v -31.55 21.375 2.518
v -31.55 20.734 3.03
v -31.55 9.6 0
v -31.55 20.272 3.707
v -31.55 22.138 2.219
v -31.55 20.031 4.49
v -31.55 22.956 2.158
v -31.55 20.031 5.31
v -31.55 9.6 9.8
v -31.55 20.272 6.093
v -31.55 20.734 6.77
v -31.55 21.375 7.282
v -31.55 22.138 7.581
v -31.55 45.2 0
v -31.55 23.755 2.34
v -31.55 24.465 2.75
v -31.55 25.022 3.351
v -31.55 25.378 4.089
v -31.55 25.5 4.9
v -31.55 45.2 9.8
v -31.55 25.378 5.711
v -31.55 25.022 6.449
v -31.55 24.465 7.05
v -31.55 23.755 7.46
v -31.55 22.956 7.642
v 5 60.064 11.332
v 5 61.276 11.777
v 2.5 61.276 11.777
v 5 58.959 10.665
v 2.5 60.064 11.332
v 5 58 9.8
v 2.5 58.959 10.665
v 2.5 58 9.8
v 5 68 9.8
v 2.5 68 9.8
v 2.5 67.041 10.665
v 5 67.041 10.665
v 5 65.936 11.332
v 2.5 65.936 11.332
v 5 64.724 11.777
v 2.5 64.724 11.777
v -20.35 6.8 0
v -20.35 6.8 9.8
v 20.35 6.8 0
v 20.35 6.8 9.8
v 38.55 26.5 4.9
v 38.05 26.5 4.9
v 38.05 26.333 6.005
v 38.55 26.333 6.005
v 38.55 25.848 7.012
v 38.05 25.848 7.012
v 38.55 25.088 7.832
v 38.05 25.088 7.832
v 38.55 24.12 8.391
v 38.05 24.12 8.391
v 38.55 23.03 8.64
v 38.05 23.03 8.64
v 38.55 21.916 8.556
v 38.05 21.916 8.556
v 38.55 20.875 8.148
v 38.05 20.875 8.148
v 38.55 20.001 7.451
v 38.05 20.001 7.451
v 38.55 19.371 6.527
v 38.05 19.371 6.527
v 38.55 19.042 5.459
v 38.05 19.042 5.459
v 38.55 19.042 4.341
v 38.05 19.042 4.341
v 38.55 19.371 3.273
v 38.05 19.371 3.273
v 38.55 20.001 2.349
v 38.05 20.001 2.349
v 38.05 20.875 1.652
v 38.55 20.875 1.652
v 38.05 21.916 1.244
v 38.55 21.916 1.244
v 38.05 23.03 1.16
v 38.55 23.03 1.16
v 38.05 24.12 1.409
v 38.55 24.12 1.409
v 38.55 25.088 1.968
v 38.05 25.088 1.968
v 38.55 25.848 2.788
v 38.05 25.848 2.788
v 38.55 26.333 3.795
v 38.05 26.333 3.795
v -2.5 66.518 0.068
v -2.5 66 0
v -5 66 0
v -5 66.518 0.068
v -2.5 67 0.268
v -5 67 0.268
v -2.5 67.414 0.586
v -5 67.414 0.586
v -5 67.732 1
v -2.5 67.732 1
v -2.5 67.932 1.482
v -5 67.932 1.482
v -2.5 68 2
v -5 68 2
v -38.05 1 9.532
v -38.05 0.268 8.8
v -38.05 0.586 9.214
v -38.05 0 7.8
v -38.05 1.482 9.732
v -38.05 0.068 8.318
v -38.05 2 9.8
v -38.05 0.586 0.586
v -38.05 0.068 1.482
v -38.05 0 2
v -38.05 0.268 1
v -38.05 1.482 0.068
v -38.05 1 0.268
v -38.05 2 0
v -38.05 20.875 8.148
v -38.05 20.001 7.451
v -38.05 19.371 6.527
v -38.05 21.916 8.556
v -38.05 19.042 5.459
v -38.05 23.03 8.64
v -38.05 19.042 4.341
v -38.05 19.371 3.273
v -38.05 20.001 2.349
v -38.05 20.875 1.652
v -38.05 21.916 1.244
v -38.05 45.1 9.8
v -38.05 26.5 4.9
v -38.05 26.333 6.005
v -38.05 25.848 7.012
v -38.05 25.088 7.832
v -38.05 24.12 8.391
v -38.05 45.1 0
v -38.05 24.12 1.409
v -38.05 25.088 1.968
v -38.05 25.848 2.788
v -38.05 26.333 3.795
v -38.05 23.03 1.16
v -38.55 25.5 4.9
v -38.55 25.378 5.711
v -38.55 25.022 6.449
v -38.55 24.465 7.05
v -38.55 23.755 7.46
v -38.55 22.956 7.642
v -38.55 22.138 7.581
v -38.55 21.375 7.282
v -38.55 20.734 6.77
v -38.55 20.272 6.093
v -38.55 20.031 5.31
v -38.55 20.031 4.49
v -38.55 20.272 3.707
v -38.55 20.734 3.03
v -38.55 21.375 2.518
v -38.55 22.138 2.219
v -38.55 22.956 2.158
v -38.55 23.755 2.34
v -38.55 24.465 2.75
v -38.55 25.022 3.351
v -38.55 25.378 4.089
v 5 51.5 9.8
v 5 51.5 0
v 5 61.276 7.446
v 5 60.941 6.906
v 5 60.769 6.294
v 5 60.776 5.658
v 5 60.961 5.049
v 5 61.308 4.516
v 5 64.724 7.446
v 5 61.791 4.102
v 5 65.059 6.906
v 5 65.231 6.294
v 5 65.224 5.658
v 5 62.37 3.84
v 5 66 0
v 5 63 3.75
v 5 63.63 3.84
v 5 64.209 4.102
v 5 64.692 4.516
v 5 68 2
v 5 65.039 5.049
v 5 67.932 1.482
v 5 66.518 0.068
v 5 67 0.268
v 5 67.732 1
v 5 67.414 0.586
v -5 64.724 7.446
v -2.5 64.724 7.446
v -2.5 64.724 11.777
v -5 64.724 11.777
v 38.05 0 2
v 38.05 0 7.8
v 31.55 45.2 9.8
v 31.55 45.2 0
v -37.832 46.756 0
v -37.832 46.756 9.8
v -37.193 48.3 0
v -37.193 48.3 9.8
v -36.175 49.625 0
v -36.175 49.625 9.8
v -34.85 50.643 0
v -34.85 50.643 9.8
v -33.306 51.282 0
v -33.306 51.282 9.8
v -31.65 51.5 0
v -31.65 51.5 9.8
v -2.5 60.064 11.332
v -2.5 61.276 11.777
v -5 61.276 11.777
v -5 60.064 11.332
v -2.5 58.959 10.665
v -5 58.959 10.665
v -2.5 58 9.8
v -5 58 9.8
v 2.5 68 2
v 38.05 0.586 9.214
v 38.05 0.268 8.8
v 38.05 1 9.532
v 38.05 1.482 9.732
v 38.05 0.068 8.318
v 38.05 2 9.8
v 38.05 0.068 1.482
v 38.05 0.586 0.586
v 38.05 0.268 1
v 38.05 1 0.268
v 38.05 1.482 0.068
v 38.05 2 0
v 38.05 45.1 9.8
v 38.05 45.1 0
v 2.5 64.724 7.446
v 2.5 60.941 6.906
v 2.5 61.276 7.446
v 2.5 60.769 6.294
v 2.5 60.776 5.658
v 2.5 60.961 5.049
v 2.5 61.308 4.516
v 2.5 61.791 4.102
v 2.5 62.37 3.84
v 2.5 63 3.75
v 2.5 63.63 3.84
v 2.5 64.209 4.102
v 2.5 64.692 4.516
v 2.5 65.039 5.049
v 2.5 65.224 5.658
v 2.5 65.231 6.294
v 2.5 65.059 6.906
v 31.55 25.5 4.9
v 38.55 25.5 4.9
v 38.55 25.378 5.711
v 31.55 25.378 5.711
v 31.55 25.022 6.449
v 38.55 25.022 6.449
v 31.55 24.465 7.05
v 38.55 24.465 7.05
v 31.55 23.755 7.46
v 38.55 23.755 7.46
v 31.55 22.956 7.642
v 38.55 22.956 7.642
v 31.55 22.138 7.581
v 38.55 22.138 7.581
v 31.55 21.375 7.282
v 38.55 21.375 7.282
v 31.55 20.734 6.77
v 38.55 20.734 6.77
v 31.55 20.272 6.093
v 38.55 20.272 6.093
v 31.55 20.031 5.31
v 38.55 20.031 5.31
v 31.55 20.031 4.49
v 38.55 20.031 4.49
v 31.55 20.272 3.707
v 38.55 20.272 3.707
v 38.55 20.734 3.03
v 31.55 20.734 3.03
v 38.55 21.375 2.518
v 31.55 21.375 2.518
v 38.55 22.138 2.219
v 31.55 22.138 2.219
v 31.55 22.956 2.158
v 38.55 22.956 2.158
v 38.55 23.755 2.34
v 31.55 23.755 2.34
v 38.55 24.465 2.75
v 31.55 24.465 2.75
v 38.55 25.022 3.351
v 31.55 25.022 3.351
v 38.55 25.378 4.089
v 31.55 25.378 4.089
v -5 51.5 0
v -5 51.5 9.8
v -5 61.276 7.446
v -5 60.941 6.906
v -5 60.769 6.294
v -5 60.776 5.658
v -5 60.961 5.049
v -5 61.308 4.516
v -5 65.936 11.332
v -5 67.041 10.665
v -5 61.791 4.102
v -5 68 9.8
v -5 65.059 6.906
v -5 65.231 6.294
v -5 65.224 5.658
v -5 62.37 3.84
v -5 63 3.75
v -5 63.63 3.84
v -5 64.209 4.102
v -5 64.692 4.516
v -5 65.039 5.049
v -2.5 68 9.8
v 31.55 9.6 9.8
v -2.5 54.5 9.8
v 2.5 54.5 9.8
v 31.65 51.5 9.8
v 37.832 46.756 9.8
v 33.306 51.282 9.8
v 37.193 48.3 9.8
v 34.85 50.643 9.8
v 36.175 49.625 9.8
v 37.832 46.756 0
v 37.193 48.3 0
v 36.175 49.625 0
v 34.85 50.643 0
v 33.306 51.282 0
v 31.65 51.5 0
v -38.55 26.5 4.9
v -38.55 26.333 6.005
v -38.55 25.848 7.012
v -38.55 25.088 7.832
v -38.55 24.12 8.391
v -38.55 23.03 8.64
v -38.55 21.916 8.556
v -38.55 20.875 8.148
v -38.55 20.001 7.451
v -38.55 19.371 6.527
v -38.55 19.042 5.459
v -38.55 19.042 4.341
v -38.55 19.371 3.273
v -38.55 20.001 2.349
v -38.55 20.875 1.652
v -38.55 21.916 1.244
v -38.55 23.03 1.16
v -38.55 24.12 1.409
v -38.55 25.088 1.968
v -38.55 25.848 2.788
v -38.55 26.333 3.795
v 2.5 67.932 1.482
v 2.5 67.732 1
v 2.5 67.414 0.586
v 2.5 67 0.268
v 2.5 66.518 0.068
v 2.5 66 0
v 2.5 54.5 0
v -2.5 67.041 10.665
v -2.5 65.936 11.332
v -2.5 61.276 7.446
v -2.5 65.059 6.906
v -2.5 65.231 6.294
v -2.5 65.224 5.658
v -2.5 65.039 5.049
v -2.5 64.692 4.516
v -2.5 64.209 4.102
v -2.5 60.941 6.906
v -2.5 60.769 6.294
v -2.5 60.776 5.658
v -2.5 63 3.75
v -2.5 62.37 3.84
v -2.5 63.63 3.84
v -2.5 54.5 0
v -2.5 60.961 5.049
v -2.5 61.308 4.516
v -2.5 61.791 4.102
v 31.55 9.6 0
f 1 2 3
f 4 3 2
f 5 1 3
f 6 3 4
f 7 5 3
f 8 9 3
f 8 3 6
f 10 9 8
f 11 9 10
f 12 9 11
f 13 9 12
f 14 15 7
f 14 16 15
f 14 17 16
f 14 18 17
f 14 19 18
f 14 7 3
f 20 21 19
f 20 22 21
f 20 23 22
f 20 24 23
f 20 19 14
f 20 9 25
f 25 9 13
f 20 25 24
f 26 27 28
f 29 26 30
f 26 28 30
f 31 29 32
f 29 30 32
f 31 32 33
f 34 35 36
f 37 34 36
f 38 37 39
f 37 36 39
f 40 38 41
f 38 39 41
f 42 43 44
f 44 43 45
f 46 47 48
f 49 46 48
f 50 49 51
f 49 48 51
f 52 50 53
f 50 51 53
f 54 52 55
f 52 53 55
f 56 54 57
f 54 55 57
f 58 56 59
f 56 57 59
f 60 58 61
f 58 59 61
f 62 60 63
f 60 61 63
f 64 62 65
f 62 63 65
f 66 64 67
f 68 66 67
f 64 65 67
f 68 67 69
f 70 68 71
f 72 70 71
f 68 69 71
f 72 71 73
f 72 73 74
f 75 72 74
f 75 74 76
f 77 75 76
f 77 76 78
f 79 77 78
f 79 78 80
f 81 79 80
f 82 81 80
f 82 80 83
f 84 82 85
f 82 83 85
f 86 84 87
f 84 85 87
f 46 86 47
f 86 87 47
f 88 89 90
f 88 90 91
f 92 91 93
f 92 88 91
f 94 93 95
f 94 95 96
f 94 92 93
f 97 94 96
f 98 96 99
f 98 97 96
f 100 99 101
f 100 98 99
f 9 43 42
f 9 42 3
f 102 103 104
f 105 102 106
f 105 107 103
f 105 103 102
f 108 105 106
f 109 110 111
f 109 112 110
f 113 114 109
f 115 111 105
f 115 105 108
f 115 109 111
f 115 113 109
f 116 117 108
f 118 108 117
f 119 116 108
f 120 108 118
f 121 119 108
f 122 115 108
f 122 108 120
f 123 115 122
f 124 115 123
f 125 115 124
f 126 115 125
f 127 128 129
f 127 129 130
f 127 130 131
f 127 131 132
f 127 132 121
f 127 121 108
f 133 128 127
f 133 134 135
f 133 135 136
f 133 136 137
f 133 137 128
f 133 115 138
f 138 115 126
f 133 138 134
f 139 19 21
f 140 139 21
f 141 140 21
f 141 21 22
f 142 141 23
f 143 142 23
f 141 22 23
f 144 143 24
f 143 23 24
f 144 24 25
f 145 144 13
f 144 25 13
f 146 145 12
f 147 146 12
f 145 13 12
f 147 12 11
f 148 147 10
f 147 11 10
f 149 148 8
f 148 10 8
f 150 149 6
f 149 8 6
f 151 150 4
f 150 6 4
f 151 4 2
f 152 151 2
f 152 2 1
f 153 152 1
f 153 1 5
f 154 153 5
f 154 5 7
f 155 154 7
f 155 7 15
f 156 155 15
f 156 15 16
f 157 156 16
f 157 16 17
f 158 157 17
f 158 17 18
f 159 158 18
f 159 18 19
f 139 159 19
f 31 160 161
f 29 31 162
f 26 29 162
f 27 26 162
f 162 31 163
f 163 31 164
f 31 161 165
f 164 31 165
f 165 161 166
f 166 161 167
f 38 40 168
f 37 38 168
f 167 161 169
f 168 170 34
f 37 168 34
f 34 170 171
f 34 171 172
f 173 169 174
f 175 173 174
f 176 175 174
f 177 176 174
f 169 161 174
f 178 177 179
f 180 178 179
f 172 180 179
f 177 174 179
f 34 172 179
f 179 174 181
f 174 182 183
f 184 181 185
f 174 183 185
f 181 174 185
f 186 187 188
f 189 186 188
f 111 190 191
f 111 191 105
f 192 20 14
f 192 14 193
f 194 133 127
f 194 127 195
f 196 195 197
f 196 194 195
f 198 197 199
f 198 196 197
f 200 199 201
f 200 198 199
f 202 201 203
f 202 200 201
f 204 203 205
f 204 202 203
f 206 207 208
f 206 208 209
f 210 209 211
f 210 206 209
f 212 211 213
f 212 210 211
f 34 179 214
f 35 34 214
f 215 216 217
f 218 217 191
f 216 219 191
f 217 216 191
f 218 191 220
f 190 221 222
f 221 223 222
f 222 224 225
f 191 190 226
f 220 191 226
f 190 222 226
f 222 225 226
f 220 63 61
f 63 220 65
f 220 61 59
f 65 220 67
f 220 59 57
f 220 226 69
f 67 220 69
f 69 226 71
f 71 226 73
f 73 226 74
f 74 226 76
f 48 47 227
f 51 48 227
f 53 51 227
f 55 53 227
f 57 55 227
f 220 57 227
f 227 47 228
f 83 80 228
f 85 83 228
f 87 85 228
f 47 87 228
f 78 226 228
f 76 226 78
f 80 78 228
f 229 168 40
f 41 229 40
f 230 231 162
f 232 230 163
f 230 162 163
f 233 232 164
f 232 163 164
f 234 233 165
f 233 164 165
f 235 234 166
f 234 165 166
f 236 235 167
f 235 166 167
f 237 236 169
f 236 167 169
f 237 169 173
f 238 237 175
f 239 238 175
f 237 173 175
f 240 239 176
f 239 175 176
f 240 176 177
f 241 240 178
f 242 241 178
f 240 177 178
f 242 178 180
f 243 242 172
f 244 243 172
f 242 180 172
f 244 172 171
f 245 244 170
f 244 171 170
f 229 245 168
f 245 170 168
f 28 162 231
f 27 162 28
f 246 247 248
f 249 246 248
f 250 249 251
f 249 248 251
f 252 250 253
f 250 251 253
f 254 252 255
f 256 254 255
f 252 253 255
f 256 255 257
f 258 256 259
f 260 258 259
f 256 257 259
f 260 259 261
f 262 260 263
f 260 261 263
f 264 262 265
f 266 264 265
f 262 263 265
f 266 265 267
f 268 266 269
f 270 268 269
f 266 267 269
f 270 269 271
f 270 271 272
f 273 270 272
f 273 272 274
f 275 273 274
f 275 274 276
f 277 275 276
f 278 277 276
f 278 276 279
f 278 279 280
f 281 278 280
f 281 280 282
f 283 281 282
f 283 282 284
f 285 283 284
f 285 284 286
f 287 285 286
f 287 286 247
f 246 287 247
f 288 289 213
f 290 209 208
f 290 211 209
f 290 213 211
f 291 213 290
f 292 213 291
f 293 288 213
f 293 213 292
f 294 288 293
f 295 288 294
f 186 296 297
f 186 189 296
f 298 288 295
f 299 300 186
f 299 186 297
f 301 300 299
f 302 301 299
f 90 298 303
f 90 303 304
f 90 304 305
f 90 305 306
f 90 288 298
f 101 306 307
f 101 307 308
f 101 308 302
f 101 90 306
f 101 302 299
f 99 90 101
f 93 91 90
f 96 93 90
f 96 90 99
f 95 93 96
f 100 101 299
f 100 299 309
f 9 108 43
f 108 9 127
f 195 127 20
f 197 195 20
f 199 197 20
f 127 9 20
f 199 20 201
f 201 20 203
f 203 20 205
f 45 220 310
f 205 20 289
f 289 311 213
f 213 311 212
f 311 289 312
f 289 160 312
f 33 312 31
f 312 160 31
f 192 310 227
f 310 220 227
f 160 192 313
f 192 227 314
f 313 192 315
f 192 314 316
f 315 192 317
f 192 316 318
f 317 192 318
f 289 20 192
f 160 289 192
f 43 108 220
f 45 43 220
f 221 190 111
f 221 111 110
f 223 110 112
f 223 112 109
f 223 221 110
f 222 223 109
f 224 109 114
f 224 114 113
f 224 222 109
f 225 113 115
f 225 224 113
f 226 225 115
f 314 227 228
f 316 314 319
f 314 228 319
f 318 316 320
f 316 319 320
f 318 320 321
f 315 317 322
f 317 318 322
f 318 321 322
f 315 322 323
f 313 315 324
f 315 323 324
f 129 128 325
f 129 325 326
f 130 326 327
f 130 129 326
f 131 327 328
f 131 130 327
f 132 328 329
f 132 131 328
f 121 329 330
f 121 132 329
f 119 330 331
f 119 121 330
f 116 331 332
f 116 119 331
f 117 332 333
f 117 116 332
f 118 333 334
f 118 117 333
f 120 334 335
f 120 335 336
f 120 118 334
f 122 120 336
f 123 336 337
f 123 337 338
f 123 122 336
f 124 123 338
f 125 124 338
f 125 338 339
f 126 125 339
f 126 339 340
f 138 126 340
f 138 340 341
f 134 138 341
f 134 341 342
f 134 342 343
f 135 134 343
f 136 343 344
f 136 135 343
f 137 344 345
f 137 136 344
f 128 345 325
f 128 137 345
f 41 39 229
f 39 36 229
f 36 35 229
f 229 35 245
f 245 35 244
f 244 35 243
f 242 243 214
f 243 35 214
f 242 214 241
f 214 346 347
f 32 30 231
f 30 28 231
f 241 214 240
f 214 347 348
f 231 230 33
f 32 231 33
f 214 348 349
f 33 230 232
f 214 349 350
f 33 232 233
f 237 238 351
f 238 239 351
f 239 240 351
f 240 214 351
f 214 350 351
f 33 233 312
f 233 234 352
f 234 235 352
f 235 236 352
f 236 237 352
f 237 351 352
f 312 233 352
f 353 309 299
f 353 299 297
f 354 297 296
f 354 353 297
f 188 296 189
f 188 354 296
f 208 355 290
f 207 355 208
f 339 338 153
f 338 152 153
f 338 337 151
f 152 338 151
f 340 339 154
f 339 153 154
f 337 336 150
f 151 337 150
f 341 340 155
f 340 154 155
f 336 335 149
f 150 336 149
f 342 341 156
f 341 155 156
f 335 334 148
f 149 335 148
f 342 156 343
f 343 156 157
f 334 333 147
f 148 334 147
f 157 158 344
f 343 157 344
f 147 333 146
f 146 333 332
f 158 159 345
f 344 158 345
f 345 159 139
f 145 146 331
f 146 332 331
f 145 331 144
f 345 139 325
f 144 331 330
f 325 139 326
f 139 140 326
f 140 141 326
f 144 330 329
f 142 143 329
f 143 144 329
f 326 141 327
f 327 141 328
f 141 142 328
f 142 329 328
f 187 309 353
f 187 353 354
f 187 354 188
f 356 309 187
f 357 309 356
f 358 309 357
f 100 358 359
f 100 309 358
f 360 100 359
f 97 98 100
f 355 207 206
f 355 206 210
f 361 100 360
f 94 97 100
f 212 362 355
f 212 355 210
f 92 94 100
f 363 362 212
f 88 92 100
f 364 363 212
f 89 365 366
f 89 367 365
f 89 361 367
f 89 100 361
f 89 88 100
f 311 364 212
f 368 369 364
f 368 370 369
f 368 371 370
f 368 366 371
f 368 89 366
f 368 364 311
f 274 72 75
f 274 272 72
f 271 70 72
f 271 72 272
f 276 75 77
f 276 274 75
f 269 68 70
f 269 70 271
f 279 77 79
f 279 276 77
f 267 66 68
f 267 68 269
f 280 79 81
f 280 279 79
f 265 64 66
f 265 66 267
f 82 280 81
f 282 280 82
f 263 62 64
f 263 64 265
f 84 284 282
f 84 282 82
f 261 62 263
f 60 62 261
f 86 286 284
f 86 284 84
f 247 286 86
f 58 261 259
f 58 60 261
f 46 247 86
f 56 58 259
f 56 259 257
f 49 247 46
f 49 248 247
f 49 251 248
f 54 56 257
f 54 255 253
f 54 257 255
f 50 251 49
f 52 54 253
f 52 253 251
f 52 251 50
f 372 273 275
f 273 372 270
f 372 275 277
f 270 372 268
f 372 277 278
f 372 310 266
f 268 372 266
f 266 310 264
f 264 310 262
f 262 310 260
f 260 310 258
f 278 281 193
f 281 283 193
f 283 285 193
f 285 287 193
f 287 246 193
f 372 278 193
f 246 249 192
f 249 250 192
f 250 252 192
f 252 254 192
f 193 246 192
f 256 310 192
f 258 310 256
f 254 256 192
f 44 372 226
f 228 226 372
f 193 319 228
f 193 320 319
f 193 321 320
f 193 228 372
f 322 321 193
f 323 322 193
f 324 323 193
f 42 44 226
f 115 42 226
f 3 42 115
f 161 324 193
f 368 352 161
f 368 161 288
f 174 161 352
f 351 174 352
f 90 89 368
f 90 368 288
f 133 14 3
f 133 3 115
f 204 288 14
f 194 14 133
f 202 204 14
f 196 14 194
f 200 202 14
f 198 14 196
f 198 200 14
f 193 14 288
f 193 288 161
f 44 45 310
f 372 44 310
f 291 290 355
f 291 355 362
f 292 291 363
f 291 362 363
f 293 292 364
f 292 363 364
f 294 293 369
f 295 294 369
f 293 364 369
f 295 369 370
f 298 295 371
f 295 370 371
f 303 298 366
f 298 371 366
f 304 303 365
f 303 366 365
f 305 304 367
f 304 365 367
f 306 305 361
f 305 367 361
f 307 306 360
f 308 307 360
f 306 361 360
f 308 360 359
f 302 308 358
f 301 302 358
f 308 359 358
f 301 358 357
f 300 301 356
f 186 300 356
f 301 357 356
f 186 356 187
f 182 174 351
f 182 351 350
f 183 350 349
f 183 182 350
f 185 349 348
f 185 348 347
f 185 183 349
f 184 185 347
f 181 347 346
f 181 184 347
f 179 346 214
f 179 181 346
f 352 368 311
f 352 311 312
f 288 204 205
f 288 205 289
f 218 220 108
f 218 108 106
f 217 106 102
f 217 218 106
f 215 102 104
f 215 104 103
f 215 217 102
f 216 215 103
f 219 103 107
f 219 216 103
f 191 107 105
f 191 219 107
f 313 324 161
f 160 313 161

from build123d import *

# Parameters (mm, degrees)
PAD002_DEPTH    = 12
POCKET007_DEPTH = 243.567033
POCKET008_DEPTH = 215.317033
SKETCH013_R     = 3.75
PAD003_DEPTH    = 0.5
SKETCH014_R     = 2.75
POCKET009_DEPTH = 77.101
POCKET010_DEPTH = 76.601
POCKET011_DEPTH = 43.551
POCKET012_DEPTH = 43.551


with BuildPart() as part:
    # Sketch010 → Pad002 (new body)
    with BuildSketch(Plane.XY):
        with BuildLine():
            Line((0, 0), (38.05, 0))
            Line((38.05, 0), (38.05, 45.1))
            ThreePointArc((38.05, 45.1), (36.175483, 49.625483), (31.65, 51.5))
            Line((31.65, 51.5), (5, 51.5))
            Line((5, 51.5), (5, 68))
            Line((5, 68), (2.5, 68))
            Line((2.5, 68), (2.5, 54.5))
            Line((2.5, 54.5), (0, 54.5))
            Line((0, 54.5), (0, 0))
        make_face()
    pad002 = extrude(amount=PAD002_DEPTH)

    # Mirrored001: Pad002 across Sketch010 V_Axis
    add(pad002.mirror(Plane(origin=(0, 0, 0), x_dir=(0, 0, 1), z_dir=(1, 0, 0))))

    # Sketch011 (on DatumPlane) → Pocket007 (cut, through all)
    with BuildSketch(Plane.YZ):
        with BuildLine():
            Line((0, 9.8), (58, 9.8))
            ThreePointArc((68, 9.8), (63, 12), (58, 9.8))
            Line((68, 12.8), (68, 9.8))
            Line((0, 12.8), (68, 12.8))
            Line((0, 9.8), (0, 12.8))
        make_face()
    pocket007 = extrude(amount=POCKET007_DEPTH, mode=Mode.SUBTRACT)

    # Mirrored002: Pocket007 across YZ
    add(pocket007.mirror(Plane.YZ), mode=Mode.SUBTRACT)

    # Sketch012 (on DatumPlane) → Pocket008 (cut, through all)
    with BuildSketch(Plane.XY.offset(9.8)):
        Polygon((0, 6.8), (20.35, 6.8), (31.55, 9.6), (31.55, 45.2), (0, 45.2), align=None)
    pocket008 = extrude(amount=-POCKET008_DEPTH, mode=Mode.SUBTRACT)

    # Mirrored003: Pocket008 across Sketch012 V_Axis
    add(pocket008.mirror(Plane(origin=(0, 0, 9.8), x_dir=(0, 0, 1), z_dir=(1, 0, 0))), mode=Mode.SUBTRACT)

    # Sketch013 (on DatumPlane) → Pad003 (join)
    with BuildSketch(Plane.YZ.offset(38.05)):
        with Locations((22.75, 4.9)):
            Circle(SKETCH013_R)
    pad003 = extrude(amount=PAD003_DEPTH)

    # Mirrored004: Pad003 across YZ
    add(pad003.mirror(Plane.YZ))

    # Sketch014 (on DatumPlane) → Pocket009 (cut, through all)
    with BuildSketch(Plane.YZ.offset(38.55)):
        with Locations((22.75, 4.9)):
            Circle(SKETCH014_R)
    extrude(amount=-POCKET009_DEPTH, mode=Mode.SUBTRACT)

    # Sketch015 (on DatumPlane) → Pocket010 (cut, through all)
    with BuildSketch(Plane.YZ.offset(38.05)):
        with BuildLine():
            Line((2, -1), (-1, -1))
            Line((-1, -1), (-1, 10.8))
            Line((-1, 10.8), (2, 10.8))
            Line((2, 10.8), (2, 9.8))
            ThreePointArc((2, 9.8), (0.585786, 9.214214), (0, 7.8))
            Line((0, 7.8), (0, 2))
            ThreePointArc((0, 2), (0.585786, 0.585786), (2, 0))
            Line((2, 0), (2, -1))
        make_face()
    extrude(amount=-POCKET010_DEPTH, mode=Mode.SUBTRACT)

    # Sketch016 (on DatumPlane) → Pocket011 (cut, through all)
    with BuildSketch(Plane.YZ.offset(5)):
        with BuildLine():
            ThreePointArc((66, 0), (67.414214, 0.585786), (68, 2))
            Line((68, 0), (68, 2))
            Line((66, 0), (68, 0))
        make_face()
    extrude(amount=-POCKET011_DEPTH, mode=Mode.SUBTRACT)

    # Sketch017 (on DatumPlane) → Pocket012 (cut, through all)
    with BuildSketch(Plane.YZ.offset(5)):
        with BuildLine():
            ThreePointArc((61.2764, 7.446272), (63, 3.75), (64.7236, 7.446272))
            Line((64.7236, 7.446272), (64.7236, 12.446272))
            Line((61.2764, 12.446272), (64.7236, 12.446272))
            Line((61.2764, 7.446272), (61.2764, 12.446272))
        make_face()
    extrude(amount=-POCKET012_DEPTH, mode=Mode.SUBTRACT)


solid = part.part
